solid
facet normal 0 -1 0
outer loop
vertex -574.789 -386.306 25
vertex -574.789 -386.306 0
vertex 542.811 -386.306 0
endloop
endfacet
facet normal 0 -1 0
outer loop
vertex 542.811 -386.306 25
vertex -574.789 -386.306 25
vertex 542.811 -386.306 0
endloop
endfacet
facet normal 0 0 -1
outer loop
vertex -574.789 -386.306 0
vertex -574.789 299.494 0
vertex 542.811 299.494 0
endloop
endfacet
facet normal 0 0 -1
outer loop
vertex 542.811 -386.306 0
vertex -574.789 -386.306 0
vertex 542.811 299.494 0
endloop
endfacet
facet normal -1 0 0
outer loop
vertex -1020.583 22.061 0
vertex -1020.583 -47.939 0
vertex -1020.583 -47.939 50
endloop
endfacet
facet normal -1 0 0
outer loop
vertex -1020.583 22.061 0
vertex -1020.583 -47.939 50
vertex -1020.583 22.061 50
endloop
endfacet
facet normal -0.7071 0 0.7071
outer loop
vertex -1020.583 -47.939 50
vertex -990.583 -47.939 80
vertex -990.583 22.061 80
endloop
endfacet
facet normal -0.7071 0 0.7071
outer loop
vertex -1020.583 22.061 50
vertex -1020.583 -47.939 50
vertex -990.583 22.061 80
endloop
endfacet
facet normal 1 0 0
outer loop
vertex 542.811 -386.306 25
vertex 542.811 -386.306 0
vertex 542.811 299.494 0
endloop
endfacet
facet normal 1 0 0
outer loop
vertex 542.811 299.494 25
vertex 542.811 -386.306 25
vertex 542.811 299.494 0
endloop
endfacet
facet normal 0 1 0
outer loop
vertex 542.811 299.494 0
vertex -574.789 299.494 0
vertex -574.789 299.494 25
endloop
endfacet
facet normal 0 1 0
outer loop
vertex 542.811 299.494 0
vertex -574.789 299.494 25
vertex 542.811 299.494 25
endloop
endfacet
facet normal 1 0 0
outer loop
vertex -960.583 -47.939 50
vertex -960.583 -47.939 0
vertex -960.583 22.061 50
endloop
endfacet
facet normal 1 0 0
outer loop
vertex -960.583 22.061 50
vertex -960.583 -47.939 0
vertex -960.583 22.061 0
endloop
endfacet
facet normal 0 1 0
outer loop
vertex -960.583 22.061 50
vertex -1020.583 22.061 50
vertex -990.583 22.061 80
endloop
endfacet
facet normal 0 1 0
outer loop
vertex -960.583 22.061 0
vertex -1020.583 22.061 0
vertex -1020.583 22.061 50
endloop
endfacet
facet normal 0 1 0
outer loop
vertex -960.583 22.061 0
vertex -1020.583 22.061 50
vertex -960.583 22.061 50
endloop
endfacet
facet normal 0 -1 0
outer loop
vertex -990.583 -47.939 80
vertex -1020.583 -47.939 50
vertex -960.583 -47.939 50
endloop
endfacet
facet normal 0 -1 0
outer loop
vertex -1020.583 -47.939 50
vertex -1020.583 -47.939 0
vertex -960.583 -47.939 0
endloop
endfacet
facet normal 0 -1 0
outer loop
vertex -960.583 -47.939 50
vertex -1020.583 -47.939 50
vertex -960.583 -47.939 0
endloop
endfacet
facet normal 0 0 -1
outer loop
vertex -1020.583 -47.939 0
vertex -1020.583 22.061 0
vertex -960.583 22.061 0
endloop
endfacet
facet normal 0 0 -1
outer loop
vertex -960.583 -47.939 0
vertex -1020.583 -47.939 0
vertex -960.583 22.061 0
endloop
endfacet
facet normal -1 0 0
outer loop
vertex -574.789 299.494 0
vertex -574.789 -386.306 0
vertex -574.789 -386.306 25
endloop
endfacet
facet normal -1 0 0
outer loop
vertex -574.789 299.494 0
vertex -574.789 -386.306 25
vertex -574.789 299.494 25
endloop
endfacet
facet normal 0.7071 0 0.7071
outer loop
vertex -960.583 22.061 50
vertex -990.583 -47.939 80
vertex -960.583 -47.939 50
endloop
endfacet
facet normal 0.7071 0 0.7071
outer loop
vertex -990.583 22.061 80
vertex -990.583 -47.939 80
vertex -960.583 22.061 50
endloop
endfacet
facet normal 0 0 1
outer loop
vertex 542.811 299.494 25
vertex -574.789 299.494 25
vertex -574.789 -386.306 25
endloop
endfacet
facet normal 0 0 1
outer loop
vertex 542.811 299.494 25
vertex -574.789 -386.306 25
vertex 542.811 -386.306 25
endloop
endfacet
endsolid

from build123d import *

# Parameters (mm, degrees)
F0_W     = 1117.6
F0_H     = 685.8
F1_DEPTH = 25
F2_W     = 60
F2_H     = 70
F3_DEPTH = 80
F4_SIZE  = 29.99999


# Not quite as in the source:
# - a fillet or chamfer is up to 0.001 mm smaller than in the source, because OpenCascade refuses the exact size


with BuildPart() as f1:
    # F0 (on Top) → F1 (new body)
    with BuildSketch(Plane.XY):
        with Locations((-15.9892961383, -43.4064045523)):
            Rectangle(F0_W, F0_H)
    extrude(amount=F1_DEPTH)


with BuildPart() as f3:
    # F2 (on Top) → F3 (new body)
    with BuildSketch(Plane.XY):
        with Locations((-990.582793951, -12.9387065261)):
            Rectangle(F2_W, F2_H)
    extrude(amount=F3_DEPTH)

    # F4 (size 30 in the source; OpenCascade refuses exactly that, so slightly less here)
    f4_edges = [f3.edges().sort_by_distance(p)[0] for p in [
        (-1020.582794, -12.938707, 80),
        (-960.582794, -12.938707, 80),
    ]]
    chamfer(f4_edges, length=F4_SIZE)


solid = Compound([f1.part, f3.part])
